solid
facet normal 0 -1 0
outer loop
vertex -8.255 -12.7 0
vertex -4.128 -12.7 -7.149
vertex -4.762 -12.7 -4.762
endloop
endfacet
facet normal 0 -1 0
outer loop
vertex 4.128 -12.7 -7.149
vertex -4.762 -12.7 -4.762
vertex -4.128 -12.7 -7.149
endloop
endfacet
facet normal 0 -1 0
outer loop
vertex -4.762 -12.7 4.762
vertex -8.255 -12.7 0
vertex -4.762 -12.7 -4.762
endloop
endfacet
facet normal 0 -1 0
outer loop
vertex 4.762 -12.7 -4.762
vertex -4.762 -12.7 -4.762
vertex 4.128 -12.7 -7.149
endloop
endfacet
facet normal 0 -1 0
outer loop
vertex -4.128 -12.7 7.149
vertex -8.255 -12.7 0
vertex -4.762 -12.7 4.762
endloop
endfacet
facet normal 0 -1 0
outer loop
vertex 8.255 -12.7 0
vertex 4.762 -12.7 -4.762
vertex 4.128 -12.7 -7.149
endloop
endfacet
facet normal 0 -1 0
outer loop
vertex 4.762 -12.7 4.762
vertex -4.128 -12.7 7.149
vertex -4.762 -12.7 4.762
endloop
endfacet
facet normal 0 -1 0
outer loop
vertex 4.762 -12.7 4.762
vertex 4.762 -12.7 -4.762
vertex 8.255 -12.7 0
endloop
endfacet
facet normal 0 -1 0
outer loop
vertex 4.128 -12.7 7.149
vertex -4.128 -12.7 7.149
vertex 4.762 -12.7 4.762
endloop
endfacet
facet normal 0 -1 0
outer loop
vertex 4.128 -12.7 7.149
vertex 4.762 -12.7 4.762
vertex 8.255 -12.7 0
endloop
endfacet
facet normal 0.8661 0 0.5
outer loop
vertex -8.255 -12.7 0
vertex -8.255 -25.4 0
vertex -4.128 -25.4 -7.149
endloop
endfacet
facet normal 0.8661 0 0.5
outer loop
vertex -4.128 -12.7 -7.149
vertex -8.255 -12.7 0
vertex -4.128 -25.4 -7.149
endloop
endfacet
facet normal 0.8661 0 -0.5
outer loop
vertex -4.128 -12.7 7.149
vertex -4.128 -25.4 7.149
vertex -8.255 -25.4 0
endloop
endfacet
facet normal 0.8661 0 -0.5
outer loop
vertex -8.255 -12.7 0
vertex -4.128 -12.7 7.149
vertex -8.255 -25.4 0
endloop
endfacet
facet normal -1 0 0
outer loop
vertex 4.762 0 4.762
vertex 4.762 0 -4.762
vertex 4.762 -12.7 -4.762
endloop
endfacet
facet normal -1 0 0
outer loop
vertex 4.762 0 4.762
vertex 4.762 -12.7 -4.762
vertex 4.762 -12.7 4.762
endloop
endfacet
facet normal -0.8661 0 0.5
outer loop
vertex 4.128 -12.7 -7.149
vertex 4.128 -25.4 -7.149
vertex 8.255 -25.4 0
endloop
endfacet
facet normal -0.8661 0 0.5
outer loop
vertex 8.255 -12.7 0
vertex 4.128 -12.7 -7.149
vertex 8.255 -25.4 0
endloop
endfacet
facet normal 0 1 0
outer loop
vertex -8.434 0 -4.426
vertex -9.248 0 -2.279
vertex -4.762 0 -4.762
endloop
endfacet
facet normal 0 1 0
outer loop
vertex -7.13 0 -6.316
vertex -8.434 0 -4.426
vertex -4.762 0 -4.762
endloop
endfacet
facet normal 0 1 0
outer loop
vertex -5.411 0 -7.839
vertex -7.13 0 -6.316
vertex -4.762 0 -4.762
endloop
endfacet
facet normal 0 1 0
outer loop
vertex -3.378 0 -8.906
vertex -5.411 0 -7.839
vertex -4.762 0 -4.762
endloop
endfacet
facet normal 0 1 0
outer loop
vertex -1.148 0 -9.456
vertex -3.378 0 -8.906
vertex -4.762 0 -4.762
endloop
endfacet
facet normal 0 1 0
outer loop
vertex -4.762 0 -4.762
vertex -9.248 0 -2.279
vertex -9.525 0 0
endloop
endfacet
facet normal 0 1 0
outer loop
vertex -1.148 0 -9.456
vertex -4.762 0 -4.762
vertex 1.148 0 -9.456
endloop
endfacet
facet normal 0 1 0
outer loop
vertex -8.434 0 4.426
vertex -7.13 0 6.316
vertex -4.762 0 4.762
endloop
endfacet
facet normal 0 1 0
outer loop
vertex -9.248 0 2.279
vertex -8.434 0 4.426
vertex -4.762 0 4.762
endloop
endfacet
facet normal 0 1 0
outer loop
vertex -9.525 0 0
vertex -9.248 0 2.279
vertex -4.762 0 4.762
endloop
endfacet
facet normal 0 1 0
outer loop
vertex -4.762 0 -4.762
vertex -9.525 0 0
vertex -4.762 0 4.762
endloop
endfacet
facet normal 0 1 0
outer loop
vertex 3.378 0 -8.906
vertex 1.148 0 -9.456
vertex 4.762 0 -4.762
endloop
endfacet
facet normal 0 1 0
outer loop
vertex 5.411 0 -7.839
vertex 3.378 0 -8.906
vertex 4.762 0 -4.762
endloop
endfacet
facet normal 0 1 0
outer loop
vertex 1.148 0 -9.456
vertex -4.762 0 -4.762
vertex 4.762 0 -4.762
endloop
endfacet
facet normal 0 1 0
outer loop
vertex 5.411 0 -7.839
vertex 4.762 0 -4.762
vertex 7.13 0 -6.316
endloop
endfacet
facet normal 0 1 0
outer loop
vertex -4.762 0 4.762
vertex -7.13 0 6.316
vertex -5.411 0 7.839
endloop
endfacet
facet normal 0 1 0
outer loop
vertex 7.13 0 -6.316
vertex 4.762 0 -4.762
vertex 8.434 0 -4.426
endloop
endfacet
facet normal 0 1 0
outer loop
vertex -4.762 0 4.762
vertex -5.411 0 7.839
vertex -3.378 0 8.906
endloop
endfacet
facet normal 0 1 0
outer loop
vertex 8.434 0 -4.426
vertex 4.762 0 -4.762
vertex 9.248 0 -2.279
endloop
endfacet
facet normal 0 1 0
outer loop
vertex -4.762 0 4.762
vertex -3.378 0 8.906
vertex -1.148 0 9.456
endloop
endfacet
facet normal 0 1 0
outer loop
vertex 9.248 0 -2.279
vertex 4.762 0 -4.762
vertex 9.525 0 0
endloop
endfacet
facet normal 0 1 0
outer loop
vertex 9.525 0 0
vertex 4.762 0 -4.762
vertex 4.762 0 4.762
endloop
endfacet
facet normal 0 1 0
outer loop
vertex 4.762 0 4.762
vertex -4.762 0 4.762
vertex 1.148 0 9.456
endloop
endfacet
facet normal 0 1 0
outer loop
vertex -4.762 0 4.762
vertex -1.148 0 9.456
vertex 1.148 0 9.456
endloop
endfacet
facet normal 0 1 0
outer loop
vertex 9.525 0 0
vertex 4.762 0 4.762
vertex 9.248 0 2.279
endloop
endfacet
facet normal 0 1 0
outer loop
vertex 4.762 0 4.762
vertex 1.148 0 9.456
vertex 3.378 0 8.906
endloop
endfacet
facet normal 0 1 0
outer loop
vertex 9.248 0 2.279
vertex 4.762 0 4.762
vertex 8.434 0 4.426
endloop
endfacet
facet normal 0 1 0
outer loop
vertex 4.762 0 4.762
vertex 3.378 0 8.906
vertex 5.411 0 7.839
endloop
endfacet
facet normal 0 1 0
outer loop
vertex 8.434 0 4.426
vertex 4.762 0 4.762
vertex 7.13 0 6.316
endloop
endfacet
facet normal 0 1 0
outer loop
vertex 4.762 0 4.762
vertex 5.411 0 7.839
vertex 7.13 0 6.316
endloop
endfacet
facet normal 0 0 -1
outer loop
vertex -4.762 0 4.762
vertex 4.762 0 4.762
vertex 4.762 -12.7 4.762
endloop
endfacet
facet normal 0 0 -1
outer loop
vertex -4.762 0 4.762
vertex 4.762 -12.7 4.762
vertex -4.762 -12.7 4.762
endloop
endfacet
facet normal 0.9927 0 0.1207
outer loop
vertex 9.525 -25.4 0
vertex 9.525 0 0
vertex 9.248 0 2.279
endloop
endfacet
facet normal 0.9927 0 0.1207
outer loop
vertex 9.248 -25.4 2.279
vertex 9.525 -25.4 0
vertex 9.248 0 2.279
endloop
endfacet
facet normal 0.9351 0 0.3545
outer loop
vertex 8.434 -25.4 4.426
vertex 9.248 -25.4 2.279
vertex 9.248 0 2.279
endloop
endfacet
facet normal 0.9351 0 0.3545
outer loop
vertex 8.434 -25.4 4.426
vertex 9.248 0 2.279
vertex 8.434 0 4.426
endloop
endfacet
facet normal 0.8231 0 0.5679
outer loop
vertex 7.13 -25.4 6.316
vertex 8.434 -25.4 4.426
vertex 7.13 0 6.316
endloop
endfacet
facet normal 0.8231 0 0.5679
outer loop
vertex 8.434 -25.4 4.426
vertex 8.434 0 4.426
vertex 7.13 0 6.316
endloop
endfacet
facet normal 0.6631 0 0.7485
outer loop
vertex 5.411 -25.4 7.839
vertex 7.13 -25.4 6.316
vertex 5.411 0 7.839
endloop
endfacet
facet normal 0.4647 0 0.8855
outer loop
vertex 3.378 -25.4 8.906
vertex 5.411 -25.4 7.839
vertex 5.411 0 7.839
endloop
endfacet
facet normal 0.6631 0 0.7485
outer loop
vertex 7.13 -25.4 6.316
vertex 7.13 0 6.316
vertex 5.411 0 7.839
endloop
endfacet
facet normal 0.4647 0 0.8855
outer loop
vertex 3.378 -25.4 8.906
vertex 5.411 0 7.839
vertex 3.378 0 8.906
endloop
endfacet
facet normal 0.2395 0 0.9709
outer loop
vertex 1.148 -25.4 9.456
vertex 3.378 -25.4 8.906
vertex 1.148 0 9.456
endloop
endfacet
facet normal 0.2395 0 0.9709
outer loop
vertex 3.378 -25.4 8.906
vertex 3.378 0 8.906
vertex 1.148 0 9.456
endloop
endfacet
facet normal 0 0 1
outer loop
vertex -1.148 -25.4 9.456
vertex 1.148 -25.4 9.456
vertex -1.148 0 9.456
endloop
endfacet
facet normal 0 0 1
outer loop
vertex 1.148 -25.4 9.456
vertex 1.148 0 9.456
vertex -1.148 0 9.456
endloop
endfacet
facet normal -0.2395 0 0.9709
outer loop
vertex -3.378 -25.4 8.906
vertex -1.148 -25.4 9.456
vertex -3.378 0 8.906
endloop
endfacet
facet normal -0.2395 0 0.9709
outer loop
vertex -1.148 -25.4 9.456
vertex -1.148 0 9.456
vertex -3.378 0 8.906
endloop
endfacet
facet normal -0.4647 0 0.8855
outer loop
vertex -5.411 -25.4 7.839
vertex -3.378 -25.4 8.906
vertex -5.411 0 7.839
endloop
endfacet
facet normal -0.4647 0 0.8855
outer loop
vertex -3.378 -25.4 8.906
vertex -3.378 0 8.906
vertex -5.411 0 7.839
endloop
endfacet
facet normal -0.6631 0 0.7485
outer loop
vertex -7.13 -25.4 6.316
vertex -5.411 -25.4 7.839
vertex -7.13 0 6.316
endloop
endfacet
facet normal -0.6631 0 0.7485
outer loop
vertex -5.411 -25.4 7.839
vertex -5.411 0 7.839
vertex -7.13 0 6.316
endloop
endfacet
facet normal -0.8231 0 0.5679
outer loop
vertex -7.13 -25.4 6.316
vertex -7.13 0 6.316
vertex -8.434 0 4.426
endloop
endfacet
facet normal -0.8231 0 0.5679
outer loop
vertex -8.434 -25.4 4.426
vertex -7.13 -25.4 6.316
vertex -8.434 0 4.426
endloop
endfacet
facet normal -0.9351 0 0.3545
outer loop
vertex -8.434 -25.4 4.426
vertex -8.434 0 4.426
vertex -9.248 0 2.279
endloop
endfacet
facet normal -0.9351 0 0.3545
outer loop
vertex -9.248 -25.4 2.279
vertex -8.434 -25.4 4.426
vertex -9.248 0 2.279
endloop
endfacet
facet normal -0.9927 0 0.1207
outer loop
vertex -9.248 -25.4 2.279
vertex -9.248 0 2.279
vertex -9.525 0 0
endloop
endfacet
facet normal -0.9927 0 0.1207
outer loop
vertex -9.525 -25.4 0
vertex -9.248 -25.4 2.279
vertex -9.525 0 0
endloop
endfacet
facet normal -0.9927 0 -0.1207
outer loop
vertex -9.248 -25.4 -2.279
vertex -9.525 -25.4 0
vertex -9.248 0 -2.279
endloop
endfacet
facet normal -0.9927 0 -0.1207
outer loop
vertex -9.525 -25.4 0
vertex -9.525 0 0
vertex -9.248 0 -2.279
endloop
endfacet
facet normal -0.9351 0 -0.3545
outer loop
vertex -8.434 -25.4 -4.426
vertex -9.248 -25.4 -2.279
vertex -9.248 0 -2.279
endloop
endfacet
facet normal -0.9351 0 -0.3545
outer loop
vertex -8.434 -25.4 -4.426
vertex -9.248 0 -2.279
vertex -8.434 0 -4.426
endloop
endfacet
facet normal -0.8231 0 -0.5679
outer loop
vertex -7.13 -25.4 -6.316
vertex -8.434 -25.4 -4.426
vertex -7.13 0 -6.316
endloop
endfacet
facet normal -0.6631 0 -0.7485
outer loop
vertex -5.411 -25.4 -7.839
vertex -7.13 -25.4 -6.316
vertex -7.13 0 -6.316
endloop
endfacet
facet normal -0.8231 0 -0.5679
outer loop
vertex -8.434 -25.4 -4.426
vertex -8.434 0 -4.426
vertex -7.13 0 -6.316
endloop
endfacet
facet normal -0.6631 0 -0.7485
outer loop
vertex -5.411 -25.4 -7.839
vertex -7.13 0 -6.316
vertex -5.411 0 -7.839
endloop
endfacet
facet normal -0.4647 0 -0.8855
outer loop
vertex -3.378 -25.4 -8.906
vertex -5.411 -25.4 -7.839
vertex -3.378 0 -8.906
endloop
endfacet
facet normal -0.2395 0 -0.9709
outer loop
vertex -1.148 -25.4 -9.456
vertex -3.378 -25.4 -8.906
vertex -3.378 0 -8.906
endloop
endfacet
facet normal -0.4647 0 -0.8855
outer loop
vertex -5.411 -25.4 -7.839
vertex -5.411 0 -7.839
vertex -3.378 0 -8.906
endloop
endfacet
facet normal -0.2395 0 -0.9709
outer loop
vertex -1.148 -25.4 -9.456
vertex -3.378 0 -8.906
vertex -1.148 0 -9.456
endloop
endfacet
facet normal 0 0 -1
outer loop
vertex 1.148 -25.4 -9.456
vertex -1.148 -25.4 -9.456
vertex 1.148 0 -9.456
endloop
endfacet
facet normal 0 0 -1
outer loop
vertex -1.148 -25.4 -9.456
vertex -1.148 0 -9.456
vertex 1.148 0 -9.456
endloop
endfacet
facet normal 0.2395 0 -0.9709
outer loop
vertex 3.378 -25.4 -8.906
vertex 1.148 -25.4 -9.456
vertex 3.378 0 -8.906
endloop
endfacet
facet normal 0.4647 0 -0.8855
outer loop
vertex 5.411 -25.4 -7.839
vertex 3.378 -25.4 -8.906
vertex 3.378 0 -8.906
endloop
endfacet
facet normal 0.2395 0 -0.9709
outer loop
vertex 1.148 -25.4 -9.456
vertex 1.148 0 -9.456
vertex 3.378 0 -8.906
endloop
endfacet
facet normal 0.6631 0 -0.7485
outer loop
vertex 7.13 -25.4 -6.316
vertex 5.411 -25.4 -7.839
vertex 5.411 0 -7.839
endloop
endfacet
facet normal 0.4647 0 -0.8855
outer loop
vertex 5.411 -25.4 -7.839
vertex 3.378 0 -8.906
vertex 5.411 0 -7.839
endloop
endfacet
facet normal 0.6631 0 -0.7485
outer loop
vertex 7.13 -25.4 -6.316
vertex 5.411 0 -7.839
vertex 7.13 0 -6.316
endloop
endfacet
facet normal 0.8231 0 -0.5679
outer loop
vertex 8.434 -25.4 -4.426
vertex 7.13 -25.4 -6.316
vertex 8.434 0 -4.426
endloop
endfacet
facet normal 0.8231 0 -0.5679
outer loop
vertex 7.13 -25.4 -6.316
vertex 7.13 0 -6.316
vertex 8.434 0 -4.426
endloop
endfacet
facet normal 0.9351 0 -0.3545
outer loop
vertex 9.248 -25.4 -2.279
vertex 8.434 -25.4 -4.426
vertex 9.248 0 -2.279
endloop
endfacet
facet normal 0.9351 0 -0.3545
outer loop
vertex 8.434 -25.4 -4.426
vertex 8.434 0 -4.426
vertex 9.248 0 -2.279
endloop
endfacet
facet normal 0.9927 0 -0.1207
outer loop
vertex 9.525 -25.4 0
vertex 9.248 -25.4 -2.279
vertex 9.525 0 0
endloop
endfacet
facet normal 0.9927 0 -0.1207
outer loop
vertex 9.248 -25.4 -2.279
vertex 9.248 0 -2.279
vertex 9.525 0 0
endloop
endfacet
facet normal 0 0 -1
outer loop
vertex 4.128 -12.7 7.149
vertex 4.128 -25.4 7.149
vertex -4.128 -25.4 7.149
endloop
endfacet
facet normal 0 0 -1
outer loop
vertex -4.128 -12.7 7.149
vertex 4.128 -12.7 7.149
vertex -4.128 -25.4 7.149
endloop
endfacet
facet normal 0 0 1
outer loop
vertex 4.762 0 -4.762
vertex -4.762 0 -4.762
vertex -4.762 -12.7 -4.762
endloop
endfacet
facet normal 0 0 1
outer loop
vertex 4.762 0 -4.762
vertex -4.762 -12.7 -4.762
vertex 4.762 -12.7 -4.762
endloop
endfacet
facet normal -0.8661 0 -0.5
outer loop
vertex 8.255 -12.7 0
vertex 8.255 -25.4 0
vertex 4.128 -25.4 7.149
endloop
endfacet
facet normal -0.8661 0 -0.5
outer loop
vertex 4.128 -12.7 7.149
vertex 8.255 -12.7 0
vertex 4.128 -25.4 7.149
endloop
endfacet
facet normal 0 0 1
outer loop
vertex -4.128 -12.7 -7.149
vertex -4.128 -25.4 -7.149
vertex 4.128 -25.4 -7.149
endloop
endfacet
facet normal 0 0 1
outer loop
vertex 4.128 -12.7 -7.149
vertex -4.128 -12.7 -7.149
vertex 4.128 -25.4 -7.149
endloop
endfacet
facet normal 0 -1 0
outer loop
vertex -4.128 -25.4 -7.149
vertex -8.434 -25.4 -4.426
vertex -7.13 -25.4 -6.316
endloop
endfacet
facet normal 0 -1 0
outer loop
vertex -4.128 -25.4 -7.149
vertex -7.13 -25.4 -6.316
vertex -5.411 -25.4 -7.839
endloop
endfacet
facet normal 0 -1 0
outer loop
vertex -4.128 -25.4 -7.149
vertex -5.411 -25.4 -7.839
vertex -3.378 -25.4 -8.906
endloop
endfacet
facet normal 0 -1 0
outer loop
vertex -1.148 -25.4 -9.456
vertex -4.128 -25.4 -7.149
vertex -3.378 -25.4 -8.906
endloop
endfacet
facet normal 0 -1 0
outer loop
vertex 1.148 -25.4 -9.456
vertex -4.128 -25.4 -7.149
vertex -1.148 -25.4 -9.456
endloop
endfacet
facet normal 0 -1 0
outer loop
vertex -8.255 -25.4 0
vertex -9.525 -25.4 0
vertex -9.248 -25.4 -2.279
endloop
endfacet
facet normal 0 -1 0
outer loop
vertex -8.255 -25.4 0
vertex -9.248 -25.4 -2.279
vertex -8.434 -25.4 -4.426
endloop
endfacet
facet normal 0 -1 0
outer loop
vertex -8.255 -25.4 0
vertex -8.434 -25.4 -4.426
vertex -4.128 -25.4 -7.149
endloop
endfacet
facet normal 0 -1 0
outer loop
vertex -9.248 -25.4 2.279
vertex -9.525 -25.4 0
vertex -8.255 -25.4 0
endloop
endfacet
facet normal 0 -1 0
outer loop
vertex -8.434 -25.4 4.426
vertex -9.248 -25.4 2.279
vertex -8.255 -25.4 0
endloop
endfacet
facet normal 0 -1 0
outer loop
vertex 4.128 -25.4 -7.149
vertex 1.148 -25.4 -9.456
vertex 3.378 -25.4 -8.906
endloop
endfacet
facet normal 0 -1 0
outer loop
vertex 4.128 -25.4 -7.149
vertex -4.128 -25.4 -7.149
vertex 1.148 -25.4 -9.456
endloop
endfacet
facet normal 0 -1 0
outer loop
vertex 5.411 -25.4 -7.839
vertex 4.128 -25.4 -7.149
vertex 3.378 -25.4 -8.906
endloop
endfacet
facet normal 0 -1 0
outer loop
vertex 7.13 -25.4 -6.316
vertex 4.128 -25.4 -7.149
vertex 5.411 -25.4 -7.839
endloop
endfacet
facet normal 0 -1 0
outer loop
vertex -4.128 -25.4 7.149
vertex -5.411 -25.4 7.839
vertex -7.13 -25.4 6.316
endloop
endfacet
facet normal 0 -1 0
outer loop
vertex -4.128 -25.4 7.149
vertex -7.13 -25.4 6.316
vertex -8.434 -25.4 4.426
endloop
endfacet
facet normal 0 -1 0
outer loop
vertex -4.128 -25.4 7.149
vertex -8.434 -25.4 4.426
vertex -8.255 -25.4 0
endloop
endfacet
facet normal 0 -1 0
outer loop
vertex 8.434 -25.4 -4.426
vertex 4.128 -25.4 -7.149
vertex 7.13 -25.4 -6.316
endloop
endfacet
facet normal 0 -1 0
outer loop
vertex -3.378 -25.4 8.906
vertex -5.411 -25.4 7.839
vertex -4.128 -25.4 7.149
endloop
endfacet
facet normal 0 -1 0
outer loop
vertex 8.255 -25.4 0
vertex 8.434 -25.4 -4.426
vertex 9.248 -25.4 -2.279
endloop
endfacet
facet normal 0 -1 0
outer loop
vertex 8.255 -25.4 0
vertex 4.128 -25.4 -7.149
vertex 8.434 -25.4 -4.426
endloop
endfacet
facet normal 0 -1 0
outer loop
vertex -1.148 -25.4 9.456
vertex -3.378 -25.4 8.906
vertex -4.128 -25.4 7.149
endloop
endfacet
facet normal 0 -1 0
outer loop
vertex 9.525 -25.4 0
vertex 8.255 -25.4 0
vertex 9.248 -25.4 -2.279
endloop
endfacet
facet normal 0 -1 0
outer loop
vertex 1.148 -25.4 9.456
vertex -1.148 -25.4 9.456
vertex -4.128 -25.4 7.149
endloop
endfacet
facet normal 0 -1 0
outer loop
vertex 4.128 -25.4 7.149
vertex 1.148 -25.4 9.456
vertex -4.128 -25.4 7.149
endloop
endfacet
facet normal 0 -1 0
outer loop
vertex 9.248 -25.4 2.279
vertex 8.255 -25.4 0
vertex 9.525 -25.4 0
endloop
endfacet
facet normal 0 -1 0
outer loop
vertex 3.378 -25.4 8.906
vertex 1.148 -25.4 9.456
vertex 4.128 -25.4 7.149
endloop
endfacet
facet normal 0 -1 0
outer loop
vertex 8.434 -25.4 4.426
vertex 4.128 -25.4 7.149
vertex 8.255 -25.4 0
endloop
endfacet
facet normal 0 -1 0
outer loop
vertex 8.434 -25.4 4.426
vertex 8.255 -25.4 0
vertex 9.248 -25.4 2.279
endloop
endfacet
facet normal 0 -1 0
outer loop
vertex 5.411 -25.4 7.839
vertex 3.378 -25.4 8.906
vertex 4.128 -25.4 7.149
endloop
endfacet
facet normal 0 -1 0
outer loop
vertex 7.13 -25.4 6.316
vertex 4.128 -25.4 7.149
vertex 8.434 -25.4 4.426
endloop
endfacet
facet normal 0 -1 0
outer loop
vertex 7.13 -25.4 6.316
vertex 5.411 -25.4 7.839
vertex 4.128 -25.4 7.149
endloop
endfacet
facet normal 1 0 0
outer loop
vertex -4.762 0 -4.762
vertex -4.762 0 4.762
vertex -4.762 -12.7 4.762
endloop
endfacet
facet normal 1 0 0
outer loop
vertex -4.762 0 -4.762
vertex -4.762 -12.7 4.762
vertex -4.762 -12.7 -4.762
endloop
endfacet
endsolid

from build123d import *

# Parameters (mm, degrees)
F0_R     = 9.525
F1_DEPTH = 25.4
F3_DEPTH = 25.401
F4_DEPTH = 12.7
F6_DEPTH = 12.7


with BuildPart() as f1:
    # F0 (on Front) → F1 (new body)
    with BuildSketch(Plane.XZ):
        Circle(F0_R)
    extrude(amount=F1_DEPTH)

    # F2 (on Front) → F3 (cut, through all)
    with BuildSketch(Plane.XZ):
        with BuildLine():
            ThreePointArc((4.7625, 0), (3.367596, 3.367596), (0, 4.7625))
            ThreePointArc((0, 4.7625), (-3.367596, 3.367596), (-4.7625, 0))
            ThreePointArc((-4.7625, 0), (-3.367596, -3.367596), (0, -4.7625))
            ThreePointArc((0, -4.7625), (3.367596, -3.367596), (4.7625, 0))
        make_face()
    extrude(amount=F3_DEPTH, mode=Mode.SUBTRACT)

    # F2 (on Front) → F4 (cut)
    with BuildSketch(Plane.XZ):
        with BuildLine():
            Line((4.7625, -4.7625), (4.7625, 0))
            ThreePointArc((4.7625, 0), (3.367596, -3.367596), (0, -4.7625))
            Line((0, -4.7625), (4.7625, -4.7625))
        make_face()
        with BuildLine():
            Line((4.7625, 4.7625), (0, 4.7625))
            ThreePointArc((0, 4.7625), (3.367596, 3.367596), (4.7625, 0))
            Line((4.7625, 0), (4.7625, 4.7625))
        make_face()
        with BuildLine():
            Line((0, 4.7625), (-4.7625, 4.7625))
            Line((-4.7625, 4.7625), (-4.7625, 0))
            ThreePointArc((-4.7625, 0), (-3.367596, 3.367596), (0, 4.7625))
        make_face()
        with BuildLine():
            ThreePointArc((0, -4.7625), (-3.367596, -3.367596), (-4.7625, 0))
            Line((-4.7625, 0), (-4.7625, -4.7625))
            Line((-4.7625, -4.7625), (0, -4.7625))
        make_face()
    extrude(amount=F4_DEPTH, mode=Mode.SUBTRACT)

    # F5 (on face) → F6 (cut)
    with BuildSketch(Plane.XZ.offset(25.4)):
        Polygon((4.1275, 7.14904), (-4.1275, 7.14904), (-8.255, 0), (-4.1275, -7.14904), (4.1275, -7.14904), (8.255, 0), align=None)
    extrude(amount=-F6_DEPTH, mode=Mode.SUBTRACT)


solid = f1.part
